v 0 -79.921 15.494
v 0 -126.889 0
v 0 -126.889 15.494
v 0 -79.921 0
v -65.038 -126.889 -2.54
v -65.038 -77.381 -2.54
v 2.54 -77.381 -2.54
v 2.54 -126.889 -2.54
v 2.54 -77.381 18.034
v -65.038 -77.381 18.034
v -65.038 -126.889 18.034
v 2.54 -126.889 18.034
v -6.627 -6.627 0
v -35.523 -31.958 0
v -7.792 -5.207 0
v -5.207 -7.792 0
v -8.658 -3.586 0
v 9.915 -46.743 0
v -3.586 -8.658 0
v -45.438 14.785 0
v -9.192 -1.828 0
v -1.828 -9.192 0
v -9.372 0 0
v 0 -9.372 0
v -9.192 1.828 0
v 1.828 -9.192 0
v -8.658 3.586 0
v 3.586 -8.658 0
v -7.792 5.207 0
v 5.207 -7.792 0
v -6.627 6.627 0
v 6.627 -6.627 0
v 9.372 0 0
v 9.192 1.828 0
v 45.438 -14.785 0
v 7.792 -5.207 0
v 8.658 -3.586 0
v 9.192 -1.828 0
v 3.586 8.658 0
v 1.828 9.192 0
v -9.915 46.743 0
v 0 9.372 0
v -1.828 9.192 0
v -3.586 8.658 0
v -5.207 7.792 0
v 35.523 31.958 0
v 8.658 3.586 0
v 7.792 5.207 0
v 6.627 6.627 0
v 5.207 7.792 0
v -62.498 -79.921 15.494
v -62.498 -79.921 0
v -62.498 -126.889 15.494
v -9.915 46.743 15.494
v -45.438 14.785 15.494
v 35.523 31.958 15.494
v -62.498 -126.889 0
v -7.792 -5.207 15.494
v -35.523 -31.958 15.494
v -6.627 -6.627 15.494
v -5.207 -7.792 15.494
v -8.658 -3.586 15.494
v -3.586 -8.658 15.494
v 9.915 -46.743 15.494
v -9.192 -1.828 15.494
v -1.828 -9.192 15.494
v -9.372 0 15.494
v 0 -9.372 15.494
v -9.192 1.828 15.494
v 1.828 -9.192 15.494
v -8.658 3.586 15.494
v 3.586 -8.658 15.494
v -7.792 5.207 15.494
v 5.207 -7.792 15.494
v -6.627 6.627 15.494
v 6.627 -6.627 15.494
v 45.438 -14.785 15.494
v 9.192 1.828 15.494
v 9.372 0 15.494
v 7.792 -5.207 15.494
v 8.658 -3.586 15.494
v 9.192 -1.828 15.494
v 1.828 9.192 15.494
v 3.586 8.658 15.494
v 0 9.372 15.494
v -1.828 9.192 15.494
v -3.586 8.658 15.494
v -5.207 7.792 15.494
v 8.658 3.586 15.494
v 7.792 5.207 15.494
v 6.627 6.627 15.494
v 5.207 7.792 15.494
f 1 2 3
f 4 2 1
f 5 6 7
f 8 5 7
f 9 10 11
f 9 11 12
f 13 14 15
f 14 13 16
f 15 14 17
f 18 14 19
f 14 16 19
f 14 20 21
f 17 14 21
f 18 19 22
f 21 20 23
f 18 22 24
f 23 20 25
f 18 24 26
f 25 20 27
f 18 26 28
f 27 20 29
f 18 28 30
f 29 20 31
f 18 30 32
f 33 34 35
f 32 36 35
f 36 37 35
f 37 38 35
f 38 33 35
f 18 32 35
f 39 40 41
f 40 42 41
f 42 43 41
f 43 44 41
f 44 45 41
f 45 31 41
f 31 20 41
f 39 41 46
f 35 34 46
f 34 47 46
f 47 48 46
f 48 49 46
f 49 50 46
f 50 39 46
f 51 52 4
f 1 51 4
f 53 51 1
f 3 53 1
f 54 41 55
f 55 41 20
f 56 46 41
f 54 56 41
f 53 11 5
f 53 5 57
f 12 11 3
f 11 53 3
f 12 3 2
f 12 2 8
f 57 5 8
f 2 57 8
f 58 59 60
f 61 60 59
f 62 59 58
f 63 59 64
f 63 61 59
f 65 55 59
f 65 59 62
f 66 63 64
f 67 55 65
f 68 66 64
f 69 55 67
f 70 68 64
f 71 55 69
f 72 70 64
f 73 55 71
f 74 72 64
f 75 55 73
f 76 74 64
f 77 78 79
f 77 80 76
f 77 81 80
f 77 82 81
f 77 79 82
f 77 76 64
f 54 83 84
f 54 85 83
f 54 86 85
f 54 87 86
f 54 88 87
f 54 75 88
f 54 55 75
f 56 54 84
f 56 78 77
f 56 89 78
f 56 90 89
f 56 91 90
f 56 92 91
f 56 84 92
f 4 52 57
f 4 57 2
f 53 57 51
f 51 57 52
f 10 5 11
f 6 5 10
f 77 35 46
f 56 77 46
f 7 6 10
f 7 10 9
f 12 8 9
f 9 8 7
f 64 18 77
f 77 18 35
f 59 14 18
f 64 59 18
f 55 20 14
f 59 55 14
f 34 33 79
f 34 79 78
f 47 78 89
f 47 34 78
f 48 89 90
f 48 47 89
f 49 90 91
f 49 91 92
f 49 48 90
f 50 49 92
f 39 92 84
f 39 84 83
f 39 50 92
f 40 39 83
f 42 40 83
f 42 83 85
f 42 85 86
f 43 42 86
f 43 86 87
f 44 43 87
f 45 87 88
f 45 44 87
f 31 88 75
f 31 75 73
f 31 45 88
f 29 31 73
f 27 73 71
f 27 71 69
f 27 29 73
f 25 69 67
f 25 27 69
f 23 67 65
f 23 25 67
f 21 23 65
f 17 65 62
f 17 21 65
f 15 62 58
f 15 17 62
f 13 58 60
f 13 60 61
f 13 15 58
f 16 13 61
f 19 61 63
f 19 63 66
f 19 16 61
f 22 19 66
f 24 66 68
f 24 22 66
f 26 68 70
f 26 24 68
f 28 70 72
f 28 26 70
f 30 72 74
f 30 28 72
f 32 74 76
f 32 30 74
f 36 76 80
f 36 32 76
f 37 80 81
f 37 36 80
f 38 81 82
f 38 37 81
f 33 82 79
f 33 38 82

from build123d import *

# Parameters (mm, degrees)
F0_R     = 9.3718433243
F1_DEPTH = 15.494
F0_W     = 62.4983049929
F0_H     = 46.9670684543
F2_T     = 2.54


with BuildPart() as f1:
    # F0 (on Top) → F1 (new body)
    with BuildSketch(Plane.XY):
        Polygon((-45.4377631109, 14.7845537997), (-35.5226807296, -31.9579802454), (9.9150823813, -46.7425340451), (45.4377631109, -14.7845537997), (35.5226807296, 31.9579802454), (-9.9150823813, 46.7425340451), align=None)
        Circle(F0_R, mode=Mode.SUBTRACT)
    extrude(amount=F1_DEPTH)


with BuildPart() as f1b:
    # F0 (on Top) → F1, piece 2 (new body)
    with BuildSketch(Plane.XY):
        with Locations((-31.2491524965, -103.4049693262)):
            Rectangle(F0_W, F0_H)
    extrude(amount=F1_DEPTH)

    # F2
    f2_openings = [f1b.faces().sort_by_distance(p)[0] for p in [
        (-31.249152, -126.888504, 7.747),
    ]]
    offset(amount=F2_T, openings=f2_openings, kind=Kind.INTERSECTION)


solid = Compound([f1.part, f1b.part])
